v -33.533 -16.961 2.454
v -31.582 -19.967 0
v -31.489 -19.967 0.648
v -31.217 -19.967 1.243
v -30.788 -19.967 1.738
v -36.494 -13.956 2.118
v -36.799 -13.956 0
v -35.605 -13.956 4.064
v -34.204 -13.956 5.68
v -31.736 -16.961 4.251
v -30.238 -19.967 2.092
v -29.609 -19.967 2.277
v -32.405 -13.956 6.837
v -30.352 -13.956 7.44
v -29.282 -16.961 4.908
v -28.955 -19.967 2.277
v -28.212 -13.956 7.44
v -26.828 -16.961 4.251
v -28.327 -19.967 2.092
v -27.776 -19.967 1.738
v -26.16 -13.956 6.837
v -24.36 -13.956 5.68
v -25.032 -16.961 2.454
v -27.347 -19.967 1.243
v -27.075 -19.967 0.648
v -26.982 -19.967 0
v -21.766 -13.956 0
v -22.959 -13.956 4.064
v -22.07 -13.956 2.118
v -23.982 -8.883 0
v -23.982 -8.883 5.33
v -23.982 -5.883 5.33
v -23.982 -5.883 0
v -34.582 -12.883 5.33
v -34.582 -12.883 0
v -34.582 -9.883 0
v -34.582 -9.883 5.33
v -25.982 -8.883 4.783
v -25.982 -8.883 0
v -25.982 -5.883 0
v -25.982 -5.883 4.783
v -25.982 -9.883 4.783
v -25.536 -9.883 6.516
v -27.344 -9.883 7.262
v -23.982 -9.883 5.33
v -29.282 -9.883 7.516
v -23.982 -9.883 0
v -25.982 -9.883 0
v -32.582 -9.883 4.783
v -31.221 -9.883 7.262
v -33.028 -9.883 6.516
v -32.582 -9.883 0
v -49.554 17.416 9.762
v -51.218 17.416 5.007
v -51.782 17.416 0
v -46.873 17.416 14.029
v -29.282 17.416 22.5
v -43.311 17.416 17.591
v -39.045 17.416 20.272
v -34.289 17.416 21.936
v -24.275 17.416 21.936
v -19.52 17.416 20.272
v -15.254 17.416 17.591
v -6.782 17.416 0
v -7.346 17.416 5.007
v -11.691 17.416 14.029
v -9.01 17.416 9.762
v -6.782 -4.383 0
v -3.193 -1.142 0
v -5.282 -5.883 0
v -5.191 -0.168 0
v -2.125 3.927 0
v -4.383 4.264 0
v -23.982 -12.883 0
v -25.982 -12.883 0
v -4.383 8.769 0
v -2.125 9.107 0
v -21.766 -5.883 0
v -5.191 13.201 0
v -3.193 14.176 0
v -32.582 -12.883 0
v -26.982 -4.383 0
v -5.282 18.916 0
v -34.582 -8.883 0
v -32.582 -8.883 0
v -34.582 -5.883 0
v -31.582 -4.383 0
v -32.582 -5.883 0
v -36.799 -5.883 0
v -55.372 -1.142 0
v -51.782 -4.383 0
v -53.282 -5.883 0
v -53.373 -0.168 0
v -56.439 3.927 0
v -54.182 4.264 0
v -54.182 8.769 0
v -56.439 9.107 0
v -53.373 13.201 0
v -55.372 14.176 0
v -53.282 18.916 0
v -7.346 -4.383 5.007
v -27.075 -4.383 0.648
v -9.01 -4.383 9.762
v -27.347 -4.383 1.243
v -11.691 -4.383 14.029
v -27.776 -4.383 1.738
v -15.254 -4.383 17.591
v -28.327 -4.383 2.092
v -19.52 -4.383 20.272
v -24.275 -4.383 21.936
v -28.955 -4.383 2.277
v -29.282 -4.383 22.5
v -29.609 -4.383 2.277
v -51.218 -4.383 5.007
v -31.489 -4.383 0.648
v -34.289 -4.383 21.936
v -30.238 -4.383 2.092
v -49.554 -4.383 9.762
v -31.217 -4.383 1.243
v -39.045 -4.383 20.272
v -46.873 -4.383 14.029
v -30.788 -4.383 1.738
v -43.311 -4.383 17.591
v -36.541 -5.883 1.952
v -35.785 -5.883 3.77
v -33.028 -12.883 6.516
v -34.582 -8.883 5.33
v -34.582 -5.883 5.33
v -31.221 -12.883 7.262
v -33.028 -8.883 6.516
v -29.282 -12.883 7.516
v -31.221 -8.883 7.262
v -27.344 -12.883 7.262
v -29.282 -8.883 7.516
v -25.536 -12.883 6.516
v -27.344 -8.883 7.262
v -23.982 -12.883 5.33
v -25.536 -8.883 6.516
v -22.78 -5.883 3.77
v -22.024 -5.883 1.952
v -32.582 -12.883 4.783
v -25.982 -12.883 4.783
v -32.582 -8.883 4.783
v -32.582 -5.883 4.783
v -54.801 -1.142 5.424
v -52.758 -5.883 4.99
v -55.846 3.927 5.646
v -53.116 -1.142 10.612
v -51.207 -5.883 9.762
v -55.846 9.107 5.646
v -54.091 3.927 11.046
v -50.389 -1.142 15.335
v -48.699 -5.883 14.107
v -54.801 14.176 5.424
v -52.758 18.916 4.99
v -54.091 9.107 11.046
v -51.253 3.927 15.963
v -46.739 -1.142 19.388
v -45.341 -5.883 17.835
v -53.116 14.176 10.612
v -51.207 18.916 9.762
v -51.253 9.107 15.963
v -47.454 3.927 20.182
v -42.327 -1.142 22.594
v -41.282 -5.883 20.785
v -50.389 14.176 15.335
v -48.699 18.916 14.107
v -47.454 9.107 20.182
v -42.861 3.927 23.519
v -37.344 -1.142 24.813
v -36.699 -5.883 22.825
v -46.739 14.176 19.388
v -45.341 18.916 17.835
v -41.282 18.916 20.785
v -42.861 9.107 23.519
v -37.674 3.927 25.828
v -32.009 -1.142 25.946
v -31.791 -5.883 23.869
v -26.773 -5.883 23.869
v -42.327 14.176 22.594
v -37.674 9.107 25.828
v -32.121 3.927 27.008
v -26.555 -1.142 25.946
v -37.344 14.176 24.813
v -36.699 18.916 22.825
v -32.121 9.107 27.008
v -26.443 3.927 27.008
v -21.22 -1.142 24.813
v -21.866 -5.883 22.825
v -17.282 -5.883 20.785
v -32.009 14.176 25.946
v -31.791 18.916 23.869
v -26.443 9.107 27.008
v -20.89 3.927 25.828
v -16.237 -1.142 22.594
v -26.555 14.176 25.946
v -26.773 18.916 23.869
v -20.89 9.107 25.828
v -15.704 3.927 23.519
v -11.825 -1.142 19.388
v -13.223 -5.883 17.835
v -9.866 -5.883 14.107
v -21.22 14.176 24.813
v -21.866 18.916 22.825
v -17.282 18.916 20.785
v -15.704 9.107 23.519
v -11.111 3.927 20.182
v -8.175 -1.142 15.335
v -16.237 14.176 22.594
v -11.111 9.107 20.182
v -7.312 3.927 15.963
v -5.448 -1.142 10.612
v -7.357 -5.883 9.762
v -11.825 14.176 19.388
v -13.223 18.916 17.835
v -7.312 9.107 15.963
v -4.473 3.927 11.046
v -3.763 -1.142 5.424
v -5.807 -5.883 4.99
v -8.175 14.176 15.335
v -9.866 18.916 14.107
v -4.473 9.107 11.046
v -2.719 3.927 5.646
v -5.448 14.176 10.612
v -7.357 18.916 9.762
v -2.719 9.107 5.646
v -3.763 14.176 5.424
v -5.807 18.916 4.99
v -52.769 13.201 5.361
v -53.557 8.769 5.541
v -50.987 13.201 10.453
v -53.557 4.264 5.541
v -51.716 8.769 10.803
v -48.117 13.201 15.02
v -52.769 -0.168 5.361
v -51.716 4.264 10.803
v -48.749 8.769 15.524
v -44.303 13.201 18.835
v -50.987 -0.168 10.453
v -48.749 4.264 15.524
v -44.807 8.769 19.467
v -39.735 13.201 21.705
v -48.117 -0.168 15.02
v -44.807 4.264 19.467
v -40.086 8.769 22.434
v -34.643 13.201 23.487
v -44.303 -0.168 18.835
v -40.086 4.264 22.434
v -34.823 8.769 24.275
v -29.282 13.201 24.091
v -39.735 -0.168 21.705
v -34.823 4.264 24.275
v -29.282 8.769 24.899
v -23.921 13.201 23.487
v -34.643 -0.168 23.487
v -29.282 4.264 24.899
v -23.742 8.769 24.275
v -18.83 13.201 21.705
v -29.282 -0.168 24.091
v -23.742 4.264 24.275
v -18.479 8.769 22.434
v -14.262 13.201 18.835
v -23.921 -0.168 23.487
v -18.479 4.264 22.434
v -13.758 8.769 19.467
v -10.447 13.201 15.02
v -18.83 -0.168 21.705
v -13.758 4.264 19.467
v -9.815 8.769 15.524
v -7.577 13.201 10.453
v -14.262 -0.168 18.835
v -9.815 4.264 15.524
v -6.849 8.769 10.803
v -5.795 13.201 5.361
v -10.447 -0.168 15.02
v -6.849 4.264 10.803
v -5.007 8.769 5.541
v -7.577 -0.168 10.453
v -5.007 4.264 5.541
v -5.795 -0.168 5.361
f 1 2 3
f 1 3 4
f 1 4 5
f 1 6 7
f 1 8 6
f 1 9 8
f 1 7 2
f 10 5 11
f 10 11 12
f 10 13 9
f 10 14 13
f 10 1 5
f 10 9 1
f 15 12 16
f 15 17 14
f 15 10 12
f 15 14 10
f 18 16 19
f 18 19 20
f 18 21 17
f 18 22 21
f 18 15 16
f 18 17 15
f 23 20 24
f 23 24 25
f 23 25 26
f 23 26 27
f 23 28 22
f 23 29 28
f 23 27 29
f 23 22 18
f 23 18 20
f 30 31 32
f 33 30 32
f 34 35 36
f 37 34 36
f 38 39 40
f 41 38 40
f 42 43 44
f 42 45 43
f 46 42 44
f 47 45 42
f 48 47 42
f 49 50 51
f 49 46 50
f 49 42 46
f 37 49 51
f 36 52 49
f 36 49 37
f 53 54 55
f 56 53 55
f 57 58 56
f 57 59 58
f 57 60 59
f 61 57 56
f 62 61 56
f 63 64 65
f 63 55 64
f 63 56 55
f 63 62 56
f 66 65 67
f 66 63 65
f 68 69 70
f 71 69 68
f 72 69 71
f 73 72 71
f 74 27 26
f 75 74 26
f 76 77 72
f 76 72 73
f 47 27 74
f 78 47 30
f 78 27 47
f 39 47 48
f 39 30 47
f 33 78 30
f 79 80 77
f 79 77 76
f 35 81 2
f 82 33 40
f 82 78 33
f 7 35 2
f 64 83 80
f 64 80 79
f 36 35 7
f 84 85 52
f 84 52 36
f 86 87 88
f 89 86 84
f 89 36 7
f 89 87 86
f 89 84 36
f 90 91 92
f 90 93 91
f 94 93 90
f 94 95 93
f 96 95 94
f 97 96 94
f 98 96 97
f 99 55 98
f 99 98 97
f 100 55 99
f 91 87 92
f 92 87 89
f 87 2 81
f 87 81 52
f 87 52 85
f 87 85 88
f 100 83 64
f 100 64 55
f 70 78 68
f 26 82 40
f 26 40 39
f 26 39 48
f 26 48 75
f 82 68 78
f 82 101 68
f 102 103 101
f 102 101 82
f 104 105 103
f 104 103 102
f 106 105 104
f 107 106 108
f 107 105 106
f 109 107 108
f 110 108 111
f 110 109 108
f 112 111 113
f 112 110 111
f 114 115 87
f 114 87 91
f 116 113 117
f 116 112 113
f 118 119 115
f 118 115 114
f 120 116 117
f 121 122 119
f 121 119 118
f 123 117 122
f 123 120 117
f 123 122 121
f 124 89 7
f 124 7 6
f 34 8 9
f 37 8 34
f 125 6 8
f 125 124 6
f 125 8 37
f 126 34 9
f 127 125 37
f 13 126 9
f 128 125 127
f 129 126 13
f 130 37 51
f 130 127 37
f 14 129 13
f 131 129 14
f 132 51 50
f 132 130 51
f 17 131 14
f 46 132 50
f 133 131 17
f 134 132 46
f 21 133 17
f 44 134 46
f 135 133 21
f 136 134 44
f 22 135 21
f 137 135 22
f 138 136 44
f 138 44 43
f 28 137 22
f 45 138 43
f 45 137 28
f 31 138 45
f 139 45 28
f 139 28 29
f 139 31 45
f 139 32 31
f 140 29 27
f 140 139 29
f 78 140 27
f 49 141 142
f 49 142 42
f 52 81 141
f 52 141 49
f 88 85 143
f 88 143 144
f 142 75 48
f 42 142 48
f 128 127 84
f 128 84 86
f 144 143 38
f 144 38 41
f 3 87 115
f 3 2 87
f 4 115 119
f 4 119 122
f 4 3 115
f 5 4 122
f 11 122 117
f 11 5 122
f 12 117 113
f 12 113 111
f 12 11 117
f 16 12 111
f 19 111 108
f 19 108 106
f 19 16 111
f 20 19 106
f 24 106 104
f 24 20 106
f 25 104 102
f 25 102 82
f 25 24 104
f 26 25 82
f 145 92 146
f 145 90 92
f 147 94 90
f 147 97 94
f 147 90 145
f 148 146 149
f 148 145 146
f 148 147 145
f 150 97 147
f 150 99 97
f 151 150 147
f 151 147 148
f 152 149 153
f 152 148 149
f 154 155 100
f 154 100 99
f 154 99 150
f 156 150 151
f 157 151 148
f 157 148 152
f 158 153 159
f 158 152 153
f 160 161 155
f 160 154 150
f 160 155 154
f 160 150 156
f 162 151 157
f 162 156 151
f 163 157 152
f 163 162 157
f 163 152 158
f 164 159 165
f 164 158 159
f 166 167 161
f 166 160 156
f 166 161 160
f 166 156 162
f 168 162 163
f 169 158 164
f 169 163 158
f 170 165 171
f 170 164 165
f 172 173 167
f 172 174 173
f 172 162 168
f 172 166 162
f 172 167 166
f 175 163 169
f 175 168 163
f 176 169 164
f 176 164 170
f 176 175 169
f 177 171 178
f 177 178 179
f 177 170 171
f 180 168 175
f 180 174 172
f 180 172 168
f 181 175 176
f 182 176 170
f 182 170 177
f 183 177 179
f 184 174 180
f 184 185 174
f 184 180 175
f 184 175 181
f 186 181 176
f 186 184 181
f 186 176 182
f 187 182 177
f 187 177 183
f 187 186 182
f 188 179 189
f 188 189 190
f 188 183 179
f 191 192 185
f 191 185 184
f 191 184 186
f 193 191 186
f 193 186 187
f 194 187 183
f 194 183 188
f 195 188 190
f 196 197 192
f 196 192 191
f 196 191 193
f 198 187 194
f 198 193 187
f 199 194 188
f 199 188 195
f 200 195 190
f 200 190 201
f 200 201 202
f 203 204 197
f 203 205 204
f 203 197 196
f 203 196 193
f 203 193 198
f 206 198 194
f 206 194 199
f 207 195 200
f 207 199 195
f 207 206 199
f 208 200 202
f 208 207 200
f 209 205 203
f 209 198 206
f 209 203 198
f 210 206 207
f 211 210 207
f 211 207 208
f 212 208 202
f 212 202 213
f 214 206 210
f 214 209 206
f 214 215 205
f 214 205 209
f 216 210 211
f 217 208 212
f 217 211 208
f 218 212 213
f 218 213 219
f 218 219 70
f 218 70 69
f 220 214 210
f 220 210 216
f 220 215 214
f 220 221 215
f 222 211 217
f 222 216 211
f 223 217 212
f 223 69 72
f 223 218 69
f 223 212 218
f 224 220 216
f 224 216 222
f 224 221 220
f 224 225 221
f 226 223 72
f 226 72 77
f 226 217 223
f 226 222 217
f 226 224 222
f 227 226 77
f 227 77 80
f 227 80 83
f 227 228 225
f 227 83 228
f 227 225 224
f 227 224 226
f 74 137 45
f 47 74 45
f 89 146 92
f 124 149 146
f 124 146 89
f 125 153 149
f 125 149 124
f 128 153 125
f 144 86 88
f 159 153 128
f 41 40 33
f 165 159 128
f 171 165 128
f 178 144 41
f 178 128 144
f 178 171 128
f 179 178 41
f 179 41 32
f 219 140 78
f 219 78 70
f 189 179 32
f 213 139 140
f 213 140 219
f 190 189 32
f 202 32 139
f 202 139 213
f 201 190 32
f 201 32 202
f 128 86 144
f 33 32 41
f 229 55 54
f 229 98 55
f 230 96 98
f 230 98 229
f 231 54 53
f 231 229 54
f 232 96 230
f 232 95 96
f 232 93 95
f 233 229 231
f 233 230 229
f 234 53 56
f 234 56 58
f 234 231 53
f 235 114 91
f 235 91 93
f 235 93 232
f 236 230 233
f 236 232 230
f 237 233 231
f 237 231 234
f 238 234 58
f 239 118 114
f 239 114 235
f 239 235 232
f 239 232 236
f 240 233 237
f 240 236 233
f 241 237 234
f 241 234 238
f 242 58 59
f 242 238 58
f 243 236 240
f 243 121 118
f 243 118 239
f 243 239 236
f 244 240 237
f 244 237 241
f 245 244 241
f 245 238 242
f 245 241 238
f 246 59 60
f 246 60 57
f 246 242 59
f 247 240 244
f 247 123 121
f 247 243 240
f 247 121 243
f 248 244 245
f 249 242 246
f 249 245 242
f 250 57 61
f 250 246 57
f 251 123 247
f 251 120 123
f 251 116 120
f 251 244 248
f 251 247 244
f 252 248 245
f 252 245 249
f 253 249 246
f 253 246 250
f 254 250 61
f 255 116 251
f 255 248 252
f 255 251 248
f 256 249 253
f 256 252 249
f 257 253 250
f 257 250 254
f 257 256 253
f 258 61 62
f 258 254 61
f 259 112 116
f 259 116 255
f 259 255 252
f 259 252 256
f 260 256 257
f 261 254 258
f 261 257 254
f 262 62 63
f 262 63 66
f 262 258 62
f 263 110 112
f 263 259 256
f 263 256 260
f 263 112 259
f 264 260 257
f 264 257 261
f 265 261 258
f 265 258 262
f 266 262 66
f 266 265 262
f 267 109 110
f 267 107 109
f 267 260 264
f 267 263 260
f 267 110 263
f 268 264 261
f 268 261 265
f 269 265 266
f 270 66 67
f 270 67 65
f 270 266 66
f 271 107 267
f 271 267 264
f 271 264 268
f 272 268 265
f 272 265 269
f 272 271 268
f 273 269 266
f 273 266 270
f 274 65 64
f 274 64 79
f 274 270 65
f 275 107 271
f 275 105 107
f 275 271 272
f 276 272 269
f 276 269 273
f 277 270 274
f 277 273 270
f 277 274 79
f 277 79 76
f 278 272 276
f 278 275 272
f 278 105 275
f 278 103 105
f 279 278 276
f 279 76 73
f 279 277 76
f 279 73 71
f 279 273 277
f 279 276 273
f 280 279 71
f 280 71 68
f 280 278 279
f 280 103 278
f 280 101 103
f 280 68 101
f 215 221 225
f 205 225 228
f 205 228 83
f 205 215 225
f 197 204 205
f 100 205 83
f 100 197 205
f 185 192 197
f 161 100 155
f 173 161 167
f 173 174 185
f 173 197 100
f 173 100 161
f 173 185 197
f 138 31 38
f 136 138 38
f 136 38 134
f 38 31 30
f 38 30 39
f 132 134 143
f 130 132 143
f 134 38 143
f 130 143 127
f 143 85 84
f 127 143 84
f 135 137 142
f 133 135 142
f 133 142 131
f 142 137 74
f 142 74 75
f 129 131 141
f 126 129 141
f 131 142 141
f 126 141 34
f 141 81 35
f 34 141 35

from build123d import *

# Parameters (mm, degrees)
REVOLUCI_N1_ANGLE     = 180
CROQUIS2_W            = 2
CROQUIS2_H            = 3
CORTAR_EXTRUIR1_DEPTH = 15
CORTAR_EXTRUIR2_START = -6.6
CROQUIS3_W            = 7.076217781
CROQUIS3_H            = 3
CROQUIS3_W_2          = 6.688868885
CORTAR_EXTRUIR2_DEPTH = 6.6


with BuildPart() as part:
    # Croquis1 → Revolución1 (revolve)
    with BuildSketch(Plane.XY):
        with BuildLine():
            Line((-51.782166939, -4.382597623), (-31.582166939, -4.382597623))
            Line((-31.582166939, -4.382597623), (-31.582166939, -19.966657293))
            Line((-31.582166939, -19.966657293), (-36.798543174, -13.956174379))
            Line((-36.798543174, -13.956174379), (-36.798543174, -5.882597623))
            Line((-36.798543174, -5.882597623), (-43.248543174, -5.882597623))
            Line((-43.248543174, -5.882597623), (-53.282166939, -5.882597623))
            ThreePointArc((-53.282166939, -5.882597623), (-56.573748762, 6.516780598), (-53.282166939, 18.916158819))
            Line((-53.282166939, 18.916158819), (-29.282166939, 18.916158819))
            Line((-29.282166939, 18.916158819), (-29.282166939, 17.416158819))
            Line((-29.282166939, 17.416158819), (-51.782166939, 17.416158819))
            ThreePointArc((-51.782166939, 17.416158819), (-54.283199087, 6.516780598), (-51.782166939, -4.382597623))
        make_face()
    revolve(axis=Axis((-29.282166939, 17.416158819, 0), (0, 1, 0)), revolution_arc=REVOLUCI_N1_ANGLE)

    # Croquis2 → Cortar-Extruir1 (cut)
    with BuildSketch(Plane(origin=(0, 0, 0), x_dir=(-1, 0, 0), z_dir=(0, 0, -1))):
        with Locations((24.982166939, -7.382597623)):
            Rectangle(CROQUIS2_W, CROQUIS2_H)
        with Locations((33.582166939, -7.382597623)):
            Rectangle(CROQUIS2_W, CROQUIS2_H)
        with Locations((33.582166939, -11.382597623)):
            Rectangle(CROQUIS2_W, CROQUIS2_H)
        with Locations((24.982166939, -11.382597623)):
            Rectangle(CROQUIS2_W, CROQUIS2_H)
    extrude(amount=-CORTAR_EXTRUIR1_DEPTH, mode=Mode.SUBTRACT)

    # Croquis3 → Cortar-Extruir2 (cut)
    with BuildSketch(Plane.ZY.offset(32.582166939).offset(CORTAR_EXTRUIR2_START)):
        with Locations((8.321249271, -11.382597623)):
            Rectangle(CROQUIS3_W, CROQUIS3_H)
        with Locations((8.127574822, -7.382597623)):
            Rectangle(CROQUIS3_W_2, CROQUIS3_H)
    extrude(amount=CORTAR_EXTRUIR2_DEPTH, mode=Mode.SUBTRACT)


solid = part.part
